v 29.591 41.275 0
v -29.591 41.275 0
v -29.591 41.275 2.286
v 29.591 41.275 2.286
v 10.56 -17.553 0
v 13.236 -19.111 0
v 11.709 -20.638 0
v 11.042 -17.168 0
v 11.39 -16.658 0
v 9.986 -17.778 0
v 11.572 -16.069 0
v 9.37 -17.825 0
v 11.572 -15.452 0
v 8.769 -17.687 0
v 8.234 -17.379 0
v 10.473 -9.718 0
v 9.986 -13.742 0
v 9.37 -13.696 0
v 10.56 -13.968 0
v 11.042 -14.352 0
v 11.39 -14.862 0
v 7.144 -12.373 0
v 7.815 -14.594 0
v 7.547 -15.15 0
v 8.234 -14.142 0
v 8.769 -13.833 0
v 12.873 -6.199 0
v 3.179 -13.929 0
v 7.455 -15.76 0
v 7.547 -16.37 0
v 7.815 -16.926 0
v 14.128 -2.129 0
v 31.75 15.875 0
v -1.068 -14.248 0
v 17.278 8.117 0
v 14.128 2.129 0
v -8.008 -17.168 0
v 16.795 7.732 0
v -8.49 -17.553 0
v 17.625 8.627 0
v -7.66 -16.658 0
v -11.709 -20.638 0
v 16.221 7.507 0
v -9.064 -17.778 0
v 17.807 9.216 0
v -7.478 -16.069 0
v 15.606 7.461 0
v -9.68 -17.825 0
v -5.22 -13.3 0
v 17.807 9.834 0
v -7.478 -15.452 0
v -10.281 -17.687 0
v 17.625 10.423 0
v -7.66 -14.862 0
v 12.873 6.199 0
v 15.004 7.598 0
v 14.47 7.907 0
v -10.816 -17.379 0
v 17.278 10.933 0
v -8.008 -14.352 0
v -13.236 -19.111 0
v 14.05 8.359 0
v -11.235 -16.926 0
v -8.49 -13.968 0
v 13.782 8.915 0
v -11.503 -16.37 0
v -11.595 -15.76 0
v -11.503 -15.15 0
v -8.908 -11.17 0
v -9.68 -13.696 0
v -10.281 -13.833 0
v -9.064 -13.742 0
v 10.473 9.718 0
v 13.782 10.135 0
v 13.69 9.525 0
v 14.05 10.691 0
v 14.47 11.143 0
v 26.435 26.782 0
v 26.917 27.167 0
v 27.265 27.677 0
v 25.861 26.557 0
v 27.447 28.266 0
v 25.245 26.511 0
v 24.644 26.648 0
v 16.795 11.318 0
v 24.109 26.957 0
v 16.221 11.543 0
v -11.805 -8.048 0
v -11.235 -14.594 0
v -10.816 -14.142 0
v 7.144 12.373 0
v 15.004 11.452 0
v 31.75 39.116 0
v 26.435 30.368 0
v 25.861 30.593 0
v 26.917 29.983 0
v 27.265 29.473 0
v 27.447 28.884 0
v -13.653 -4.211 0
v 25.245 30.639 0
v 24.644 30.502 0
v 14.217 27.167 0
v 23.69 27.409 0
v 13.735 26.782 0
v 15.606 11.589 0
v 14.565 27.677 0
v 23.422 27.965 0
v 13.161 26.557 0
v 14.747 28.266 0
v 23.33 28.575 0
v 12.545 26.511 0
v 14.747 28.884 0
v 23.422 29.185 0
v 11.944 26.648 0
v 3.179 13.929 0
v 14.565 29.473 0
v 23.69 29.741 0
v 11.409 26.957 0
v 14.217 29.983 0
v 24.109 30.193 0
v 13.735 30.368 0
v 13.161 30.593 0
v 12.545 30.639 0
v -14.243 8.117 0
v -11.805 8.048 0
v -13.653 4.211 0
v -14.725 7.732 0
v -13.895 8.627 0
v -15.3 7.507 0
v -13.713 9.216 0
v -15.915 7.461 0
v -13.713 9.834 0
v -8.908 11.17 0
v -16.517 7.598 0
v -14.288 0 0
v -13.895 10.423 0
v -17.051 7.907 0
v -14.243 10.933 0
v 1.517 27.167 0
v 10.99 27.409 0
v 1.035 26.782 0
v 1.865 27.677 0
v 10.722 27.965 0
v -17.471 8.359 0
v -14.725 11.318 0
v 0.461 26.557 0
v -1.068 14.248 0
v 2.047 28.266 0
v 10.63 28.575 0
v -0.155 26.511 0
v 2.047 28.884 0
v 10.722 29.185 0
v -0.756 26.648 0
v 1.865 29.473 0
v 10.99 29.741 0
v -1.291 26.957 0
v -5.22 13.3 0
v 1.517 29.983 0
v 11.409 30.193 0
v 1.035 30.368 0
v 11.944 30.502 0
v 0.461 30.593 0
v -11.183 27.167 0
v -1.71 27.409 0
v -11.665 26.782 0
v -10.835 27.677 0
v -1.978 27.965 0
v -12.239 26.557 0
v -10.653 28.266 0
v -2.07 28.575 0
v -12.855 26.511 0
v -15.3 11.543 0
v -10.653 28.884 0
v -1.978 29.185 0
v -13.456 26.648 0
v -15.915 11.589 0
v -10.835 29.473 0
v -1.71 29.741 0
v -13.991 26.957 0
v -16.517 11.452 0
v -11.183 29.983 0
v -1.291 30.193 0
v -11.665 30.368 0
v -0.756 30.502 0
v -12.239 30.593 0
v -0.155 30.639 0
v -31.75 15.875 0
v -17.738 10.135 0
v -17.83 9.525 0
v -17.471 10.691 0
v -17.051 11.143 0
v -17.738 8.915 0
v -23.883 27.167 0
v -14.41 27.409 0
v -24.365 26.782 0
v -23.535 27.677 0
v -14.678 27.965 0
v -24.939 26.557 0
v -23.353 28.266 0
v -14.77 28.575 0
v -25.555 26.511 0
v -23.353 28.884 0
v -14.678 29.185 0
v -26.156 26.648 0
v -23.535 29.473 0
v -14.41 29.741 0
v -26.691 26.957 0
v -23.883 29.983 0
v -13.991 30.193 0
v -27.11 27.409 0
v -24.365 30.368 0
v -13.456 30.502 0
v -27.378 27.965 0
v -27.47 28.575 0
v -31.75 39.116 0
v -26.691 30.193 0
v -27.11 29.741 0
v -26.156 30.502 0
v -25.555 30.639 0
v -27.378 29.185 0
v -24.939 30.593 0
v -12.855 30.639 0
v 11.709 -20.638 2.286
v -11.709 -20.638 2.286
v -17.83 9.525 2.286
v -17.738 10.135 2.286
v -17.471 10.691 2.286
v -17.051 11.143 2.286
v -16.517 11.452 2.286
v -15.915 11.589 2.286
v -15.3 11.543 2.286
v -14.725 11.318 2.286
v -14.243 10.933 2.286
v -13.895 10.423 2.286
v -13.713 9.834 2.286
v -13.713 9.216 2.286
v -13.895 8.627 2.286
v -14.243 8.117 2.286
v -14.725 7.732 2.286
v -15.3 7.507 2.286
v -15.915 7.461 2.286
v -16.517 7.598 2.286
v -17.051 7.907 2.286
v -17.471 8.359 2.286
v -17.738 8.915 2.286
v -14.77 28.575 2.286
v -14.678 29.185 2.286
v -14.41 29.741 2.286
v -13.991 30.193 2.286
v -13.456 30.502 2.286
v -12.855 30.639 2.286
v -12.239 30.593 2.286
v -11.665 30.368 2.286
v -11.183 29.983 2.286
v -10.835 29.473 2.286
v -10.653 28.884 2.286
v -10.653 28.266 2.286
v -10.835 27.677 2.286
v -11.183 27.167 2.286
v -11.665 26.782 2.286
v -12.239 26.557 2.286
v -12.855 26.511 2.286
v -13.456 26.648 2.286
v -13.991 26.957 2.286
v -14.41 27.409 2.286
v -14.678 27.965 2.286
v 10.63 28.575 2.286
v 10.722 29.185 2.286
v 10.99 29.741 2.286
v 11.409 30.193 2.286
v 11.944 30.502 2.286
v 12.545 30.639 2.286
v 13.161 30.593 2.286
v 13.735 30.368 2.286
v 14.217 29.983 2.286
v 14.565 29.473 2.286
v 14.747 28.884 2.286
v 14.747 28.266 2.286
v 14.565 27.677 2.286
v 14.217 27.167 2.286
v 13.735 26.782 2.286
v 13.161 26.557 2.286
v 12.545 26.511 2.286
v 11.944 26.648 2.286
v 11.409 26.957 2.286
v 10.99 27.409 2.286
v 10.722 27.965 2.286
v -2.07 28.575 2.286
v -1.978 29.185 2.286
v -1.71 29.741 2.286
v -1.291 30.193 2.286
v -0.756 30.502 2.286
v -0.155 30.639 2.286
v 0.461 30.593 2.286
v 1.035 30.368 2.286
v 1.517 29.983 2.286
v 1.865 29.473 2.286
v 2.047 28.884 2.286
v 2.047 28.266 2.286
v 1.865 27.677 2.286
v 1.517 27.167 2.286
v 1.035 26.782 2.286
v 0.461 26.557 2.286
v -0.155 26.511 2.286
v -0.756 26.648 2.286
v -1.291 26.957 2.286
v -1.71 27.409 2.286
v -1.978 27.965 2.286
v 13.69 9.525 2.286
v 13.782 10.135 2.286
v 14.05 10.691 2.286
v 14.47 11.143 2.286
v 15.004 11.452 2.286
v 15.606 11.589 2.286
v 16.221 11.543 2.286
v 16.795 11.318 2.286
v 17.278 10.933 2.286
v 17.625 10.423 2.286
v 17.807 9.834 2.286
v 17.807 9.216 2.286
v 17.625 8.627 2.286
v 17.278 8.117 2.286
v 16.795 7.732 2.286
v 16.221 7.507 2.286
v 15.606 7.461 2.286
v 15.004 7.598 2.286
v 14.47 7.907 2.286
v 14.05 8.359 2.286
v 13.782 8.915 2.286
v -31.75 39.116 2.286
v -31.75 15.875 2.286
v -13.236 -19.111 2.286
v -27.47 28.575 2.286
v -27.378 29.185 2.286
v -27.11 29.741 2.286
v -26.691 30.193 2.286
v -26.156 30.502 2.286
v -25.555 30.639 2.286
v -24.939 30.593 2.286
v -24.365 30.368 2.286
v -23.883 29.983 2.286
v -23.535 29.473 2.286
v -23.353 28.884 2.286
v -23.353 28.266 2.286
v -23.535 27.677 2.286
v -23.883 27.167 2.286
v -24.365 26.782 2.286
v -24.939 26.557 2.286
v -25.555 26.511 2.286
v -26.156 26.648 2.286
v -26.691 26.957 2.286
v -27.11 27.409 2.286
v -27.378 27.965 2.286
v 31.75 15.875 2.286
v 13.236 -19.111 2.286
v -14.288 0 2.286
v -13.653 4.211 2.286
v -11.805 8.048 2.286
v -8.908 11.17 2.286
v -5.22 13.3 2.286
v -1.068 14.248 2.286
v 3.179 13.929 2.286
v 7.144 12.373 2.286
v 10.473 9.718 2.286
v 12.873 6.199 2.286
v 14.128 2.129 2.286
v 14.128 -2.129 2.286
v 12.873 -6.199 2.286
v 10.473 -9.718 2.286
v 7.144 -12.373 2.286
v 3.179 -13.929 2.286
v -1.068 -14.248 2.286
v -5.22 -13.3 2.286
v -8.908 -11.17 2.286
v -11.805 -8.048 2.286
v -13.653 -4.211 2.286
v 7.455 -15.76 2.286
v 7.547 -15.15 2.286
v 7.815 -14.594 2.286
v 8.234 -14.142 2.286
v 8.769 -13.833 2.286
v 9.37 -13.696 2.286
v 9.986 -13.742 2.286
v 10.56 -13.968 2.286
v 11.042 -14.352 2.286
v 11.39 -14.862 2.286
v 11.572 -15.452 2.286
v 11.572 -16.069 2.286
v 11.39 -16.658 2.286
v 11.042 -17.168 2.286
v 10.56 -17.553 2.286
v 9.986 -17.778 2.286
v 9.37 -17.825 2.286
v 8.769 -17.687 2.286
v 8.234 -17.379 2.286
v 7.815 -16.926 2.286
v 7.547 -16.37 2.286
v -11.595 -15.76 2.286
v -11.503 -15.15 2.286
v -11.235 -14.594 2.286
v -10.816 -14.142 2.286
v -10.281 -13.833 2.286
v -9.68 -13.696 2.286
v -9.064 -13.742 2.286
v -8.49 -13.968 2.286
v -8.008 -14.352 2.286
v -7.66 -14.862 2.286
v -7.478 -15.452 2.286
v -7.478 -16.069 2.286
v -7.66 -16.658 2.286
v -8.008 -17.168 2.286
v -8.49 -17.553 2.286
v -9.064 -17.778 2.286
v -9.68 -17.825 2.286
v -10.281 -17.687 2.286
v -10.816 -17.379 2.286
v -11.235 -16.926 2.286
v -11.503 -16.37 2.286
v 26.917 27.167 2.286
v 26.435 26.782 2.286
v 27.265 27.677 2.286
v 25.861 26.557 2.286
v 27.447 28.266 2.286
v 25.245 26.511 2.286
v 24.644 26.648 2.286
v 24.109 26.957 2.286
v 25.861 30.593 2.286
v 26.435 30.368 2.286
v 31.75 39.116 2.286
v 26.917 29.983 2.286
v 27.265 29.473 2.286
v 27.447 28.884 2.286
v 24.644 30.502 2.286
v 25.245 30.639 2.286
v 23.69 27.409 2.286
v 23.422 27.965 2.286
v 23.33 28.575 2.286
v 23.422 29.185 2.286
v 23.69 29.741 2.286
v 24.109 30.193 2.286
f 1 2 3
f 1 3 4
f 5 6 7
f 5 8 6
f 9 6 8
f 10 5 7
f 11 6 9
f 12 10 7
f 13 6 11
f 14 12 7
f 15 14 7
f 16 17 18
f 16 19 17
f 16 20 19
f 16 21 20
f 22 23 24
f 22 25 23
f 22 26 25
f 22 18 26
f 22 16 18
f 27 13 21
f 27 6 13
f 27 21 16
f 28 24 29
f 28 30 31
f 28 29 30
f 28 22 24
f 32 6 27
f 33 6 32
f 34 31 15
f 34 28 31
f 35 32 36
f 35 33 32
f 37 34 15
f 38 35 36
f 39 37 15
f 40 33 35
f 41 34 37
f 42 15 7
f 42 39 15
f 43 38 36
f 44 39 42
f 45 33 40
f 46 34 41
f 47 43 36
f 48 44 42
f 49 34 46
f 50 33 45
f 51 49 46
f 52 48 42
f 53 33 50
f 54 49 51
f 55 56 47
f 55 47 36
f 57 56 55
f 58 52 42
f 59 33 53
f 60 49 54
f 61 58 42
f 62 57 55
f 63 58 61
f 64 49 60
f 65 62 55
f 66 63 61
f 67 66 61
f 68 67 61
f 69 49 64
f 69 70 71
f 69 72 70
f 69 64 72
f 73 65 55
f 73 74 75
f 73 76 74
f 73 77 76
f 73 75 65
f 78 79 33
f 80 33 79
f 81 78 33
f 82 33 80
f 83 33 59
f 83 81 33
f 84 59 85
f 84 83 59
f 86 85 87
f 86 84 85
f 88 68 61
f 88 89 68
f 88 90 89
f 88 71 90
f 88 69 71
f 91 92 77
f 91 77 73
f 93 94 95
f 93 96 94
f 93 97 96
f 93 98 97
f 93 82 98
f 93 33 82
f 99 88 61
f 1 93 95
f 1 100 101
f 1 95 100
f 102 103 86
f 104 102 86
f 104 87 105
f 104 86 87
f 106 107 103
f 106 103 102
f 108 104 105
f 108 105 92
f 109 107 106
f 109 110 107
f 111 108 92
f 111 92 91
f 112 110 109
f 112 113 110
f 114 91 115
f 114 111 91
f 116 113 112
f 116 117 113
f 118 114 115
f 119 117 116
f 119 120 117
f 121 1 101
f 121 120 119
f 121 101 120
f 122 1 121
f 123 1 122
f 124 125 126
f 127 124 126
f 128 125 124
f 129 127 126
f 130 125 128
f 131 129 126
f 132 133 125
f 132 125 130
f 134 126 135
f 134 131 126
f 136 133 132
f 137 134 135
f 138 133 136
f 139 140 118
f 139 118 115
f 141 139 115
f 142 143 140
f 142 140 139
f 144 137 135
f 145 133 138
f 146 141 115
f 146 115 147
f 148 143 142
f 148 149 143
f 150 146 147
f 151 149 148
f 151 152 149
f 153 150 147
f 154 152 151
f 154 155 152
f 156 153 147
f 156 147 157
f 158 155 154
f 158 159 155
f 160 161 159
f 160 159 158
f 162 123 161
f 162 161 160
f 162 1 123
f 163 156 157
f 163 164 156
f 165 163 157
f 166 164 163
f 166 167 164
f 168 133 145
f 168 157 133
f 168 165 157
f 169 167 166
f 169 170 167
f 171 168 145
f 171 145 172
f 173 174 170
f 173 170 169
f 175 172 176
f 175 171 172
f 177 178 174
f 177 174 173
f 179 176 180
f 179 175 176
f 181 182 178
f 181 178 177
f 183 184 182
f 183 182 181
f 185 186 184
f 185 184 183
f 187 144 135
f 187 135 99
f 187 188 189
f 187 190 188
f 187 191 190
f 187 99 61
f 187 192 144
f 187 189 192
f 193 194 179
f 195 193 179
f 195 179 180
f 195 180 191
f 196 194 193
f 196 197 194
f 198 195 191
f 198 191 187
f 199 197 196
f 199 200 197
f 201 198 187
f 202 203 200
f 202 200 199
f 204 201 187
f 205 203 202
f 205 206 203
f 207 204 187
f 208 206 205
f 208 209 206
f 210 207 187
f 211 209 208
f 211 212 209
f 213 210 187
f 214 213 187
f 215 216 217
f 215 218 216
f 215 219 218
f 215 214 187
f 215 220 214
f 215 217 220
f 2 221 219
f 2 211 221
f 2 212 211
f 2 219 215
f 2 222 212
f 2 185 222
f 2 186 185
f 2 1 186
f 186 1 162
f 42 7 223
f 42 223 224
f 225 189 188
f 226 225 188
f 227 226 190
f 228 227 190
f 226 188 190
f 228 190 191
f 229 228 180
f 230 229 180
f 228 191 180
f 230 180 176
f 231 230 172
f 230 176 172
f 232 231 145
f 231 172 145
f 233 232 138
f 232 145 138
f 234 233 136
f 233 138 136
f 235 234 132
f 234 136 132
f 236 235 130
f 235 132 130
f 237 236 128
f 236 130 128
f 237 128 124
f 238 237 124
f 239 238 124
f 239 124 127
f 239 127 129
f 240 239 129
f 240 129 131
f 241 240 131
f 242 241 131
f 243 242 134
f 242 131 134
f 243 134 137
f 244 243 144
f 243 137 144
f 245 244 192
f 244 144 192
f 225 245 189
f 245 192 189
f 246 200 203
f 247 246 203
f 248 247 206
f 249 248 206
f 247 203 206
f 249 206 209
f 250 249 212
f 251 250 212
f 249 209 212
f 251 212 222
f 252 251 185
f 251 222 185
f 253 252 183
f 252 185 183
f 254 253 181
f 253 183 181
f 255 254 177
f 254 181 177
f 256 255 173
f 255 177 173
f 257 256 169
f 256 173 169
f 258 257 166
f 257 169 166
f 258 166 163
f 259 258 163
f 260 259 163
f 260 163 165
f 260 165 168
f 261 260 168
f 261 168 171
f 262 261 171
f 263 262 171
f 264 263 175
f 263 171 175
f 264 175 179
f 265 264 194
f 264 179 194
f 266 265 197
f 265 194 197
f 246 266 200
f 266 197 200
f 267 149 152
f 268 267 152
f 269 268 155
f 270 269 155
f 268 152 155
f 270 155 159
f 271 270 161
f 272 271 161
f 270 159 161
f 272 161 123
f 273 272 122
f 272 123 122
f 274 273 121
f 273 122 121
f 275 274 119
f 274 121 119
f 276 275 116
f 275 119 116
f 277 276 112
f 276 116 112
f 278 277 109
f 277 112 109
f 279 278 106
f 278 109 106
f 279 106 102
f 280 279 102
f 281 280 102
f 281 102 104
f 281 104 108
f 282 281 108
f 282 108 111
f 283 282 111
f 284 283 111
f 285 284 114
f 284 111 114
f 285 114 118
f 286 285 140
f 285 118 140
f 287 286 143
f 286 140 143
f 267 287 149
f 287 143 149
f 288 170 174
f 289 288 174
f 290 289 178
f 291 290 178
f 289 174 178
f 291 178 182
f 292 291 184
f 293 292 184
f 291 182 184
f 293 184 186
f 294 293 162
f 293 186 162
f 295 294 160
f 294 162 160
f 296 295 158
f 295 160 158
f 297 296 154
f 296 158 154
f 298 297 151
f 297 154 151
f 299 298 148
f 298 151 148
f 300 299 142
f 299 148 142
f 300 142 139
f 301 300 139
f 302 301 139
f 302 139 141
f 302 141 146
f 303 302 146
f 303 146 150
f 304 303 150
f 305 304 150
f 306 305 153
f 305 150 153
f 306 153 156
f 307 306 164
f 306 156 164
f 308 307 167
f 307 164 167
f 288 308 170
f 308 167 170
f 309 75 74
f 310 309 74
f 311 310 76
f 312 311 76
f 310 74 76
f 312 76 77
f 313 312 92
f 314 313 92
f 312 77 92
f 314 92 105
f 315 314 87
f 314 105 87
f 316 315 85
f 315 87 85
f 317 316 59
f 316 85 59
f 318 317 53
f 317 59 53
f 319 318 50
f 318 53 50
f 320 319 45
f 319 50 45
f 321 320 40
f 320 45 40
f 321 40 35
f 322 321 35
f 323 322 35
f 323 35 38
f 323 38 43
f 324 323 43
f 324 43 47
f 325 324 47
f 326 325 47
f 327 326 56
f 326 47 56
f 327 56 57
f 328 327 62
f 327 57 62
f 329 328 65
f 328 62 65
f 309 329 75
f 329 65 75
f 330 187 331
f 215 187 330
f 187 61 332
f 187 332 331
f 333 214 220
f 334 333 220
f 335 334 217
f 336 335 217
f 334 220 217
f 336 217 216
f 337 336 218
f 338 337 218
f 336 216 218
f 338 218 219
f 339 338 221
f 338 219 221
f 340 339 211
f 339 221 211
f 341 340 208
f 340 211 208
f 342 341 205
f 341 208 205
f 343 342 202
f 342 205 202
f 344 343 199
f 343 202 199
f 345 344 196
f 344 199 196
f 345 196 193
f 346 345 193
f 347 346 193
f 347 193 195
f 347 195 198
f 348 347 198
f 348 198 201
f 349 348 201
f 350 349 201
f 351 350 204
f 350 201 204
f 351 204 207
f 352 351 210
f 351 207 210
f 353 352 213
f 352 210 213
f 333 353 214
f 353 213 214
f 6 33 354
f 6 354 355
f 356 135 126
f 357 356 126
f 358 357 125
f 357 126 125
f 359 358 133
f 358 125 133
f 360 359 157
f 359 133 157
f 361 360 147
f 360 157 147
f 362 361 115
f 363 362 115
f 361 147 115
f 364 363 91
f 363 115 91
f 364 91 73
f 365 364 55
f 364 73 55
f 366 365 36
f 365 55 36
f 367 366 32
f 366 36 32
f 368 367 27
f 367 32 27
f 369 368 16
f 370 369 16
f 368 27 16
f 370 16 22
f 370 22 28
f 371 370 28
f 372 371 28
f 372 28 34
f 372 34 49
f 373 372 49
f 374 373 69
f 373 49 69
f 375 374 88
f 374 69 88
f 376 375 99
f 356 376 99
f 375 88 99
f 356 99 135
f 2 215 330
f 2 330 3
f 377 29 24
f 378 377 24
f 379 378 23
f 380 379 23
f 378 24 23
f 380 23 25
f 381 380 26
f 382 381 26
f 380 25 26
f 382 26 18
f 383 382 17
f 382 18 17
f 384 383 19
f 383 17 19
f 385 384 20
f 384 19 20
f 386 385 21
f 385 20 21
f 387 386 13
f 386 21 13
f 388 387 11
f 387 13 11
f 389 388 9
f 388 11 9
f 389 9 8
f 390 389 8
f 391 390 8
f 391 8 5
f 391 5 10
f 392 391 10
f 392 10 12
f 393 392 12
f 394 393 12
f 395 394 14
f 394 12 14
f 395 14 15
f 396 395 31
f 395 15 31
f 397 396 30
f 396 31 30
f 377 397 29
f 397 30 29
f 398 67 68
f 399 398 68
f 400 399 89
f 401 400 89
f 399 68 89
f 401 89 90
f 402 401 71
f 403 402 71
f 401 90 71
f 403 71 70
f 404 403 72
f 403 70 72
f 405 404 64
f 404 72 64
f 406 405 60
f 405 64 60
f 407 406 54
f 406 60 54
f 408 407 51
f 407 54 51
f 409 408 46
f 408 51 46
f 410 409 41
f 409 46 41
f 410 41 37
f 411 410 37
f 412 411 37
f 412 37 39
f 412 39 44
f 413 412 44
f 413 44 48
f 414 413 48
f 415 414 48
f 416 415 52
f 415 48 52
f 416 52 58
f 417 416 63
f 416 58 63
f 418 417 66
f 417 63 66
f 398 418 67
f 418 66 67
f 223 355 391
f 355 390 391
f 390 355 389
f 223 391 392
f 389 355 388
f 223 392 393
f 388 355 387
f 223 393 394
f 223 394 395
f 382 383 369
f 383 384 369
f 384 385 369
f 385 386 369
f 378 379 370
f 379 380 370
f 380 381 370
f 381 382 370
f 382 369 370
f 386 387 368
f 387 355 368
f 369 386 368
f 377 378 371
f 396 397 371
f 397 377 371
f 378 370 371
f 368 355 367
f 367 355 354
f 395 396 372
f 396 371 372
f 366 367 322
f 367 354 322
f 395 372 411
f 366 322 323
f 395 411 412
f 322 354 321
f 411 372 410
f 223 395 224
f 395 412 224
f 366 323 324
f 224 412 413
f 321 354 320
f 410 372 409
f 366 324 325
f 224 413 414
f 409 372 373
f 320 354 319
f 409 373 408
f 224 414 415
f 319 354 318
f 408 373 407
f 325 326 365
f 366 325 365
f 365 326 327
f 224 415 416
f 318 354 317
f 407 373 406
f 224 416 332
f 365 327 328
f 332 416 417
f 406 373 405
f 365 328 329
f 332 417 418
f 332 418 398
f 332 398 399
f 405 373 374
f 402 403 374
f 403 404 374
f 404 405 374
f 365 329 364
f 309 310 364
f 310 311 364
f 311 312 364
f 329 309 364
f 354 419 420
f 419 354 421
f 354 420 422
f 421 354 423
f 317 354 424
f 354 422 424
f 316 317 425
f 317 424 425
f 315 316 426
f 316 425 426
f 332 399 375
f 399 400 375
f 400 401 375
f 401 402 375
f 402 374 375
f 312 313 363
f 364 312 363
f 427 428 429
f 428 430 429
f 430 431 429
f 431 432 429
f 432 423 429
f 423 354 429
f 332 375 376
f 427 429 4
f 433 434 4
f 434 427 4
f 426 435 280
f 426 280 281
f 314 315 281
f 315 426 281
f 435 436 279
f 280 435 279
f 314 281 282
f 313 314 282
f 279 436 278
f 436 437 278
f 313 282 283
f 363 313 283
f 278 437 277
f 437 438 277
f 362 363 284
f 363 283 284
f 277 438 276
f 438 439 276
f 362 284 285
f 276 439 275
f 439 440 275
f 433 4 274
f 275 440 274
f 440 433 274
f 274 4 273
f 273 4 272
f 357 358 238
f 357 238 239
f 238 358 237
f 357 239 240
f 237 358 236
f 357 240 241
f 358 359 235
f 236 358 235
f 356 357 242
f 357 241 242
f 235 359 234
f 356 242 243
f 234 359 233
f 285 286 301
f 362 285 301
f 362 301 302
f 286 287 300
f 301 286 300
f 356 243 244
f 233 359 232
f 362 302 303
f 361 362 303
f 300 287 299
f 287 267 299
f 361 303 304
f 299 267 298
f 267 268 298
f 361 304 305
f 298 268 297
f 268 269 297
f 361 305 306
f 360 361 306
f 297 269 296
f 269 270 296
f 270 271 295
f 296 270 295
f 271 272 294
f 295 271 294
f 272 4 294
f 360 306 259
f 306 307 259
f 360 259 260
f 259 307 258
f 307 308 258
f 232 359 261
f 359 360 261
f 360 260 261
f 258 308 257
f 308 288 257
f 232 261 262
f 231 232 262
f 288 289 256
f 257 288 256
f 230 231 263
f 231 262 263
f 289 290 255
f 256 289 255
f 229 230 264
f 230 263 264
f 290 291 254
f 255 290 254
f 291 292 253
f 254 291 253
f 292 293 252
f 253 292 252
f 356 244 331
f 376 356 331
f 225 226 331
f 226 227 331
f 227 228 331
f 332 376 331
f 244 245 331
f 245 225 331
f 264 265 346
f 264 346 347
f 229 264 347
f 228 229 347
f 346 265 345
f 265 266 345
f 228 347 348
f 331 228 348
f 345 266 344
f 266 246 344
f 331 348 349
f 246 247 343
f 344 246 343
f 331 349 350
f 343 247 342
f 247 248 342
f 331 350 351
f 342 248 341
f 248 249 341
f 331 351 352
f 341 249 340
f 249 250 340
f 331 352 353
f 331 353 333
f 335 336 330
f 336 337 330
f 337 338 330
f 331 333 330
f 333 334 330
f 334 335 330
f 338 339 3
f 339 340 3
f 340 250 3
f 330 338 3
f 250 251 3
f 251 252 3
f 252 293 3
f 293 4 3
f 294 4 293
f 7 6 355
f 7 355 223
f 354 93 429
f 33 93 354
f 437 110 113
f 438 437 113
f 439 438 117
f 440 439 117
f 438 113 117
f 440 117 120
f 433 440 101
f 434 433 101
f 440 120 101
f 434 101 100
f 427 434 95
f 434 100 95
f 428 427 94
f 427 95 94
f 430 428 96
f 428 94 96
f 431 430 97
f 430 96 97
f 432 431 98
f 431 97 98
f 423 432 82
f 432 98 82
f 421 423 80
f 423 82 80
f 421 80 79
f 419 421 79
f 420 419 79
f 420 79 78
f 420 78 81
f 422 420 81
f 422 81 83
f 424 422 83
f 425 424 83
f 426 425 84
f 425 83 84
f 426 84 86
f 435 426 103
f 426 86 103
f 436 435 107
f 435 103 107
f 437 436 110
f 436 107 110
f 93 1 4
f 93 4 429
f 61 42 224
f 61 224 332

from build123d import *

# Parameters (mm, degrees)
SKETCH1_R           = 2.0701
SKETCH1_R_2         = 14.2875
BOSS_EXTRUDE1_DEPTH = 2.286


with BuildPart() as part:
    # Sketch1 → Boss-Extrude1 (new body)
    with BuildSketch(Plane(origin=(0, 0, 0), x_dir=(-1, 0, 0), z_dir=(0, 0, -1))):
        Polygon((-29.591, 41.275), (-31.75, 39.116), (-31.75, 15.875), (-13.235753401, -19.110856459), (-11.70910986, -20.6375), (11.70910986, -20.6375), (13.235753401, -19.110856459), (31.75, 15.875), (31.75, 39.116), (29.591, 41.275), align=None)
        with Locations((-15.76028553, 9.525)):
            Circle(SKETCH1_R, mode=Mode.SUBTRACT)
        with Locations((9.525, -15.76028553)):
            Circle(SKETCH1_R, mode=Mode.SUBTRACT)
        with Locations((-12.7, 28.575)):
            Circle(SKETCH1_R, mode=Mode.SUBTRACT)
        with Locations((12.7, 28.575)):
            Circle(SKETCH1_R, mode=Mode.SUBTRACT)
        with Locations((25.4, 28.575)):
            Circle(SKETCH1_R, mode=Mode.SUBTRACT)
        Circle(SKETCH1_R_2, mode=Mode.SUBTRACT)
        with Locations((-25.4, 28.575)):
            Circle(SKETCH1_R, mode=Mode.SUBTRACT)
        with Locations((0, 28.575)):
            Circle(SKETCH1_R, mode=Mode.SUBTRACT)
        with Locations((15.76028553, 9.525)):
            Circle(SKETCH1_R, mode=Mode.SUBTRACT)
        with Locations((-9.525, -15.76028553)):
            Circle(SKETCH1_R, mode=Mode.SUBTRACT)
    extrude(amount=-BOSS_EXTRUDE1_DEPTH)


solid = part.part
